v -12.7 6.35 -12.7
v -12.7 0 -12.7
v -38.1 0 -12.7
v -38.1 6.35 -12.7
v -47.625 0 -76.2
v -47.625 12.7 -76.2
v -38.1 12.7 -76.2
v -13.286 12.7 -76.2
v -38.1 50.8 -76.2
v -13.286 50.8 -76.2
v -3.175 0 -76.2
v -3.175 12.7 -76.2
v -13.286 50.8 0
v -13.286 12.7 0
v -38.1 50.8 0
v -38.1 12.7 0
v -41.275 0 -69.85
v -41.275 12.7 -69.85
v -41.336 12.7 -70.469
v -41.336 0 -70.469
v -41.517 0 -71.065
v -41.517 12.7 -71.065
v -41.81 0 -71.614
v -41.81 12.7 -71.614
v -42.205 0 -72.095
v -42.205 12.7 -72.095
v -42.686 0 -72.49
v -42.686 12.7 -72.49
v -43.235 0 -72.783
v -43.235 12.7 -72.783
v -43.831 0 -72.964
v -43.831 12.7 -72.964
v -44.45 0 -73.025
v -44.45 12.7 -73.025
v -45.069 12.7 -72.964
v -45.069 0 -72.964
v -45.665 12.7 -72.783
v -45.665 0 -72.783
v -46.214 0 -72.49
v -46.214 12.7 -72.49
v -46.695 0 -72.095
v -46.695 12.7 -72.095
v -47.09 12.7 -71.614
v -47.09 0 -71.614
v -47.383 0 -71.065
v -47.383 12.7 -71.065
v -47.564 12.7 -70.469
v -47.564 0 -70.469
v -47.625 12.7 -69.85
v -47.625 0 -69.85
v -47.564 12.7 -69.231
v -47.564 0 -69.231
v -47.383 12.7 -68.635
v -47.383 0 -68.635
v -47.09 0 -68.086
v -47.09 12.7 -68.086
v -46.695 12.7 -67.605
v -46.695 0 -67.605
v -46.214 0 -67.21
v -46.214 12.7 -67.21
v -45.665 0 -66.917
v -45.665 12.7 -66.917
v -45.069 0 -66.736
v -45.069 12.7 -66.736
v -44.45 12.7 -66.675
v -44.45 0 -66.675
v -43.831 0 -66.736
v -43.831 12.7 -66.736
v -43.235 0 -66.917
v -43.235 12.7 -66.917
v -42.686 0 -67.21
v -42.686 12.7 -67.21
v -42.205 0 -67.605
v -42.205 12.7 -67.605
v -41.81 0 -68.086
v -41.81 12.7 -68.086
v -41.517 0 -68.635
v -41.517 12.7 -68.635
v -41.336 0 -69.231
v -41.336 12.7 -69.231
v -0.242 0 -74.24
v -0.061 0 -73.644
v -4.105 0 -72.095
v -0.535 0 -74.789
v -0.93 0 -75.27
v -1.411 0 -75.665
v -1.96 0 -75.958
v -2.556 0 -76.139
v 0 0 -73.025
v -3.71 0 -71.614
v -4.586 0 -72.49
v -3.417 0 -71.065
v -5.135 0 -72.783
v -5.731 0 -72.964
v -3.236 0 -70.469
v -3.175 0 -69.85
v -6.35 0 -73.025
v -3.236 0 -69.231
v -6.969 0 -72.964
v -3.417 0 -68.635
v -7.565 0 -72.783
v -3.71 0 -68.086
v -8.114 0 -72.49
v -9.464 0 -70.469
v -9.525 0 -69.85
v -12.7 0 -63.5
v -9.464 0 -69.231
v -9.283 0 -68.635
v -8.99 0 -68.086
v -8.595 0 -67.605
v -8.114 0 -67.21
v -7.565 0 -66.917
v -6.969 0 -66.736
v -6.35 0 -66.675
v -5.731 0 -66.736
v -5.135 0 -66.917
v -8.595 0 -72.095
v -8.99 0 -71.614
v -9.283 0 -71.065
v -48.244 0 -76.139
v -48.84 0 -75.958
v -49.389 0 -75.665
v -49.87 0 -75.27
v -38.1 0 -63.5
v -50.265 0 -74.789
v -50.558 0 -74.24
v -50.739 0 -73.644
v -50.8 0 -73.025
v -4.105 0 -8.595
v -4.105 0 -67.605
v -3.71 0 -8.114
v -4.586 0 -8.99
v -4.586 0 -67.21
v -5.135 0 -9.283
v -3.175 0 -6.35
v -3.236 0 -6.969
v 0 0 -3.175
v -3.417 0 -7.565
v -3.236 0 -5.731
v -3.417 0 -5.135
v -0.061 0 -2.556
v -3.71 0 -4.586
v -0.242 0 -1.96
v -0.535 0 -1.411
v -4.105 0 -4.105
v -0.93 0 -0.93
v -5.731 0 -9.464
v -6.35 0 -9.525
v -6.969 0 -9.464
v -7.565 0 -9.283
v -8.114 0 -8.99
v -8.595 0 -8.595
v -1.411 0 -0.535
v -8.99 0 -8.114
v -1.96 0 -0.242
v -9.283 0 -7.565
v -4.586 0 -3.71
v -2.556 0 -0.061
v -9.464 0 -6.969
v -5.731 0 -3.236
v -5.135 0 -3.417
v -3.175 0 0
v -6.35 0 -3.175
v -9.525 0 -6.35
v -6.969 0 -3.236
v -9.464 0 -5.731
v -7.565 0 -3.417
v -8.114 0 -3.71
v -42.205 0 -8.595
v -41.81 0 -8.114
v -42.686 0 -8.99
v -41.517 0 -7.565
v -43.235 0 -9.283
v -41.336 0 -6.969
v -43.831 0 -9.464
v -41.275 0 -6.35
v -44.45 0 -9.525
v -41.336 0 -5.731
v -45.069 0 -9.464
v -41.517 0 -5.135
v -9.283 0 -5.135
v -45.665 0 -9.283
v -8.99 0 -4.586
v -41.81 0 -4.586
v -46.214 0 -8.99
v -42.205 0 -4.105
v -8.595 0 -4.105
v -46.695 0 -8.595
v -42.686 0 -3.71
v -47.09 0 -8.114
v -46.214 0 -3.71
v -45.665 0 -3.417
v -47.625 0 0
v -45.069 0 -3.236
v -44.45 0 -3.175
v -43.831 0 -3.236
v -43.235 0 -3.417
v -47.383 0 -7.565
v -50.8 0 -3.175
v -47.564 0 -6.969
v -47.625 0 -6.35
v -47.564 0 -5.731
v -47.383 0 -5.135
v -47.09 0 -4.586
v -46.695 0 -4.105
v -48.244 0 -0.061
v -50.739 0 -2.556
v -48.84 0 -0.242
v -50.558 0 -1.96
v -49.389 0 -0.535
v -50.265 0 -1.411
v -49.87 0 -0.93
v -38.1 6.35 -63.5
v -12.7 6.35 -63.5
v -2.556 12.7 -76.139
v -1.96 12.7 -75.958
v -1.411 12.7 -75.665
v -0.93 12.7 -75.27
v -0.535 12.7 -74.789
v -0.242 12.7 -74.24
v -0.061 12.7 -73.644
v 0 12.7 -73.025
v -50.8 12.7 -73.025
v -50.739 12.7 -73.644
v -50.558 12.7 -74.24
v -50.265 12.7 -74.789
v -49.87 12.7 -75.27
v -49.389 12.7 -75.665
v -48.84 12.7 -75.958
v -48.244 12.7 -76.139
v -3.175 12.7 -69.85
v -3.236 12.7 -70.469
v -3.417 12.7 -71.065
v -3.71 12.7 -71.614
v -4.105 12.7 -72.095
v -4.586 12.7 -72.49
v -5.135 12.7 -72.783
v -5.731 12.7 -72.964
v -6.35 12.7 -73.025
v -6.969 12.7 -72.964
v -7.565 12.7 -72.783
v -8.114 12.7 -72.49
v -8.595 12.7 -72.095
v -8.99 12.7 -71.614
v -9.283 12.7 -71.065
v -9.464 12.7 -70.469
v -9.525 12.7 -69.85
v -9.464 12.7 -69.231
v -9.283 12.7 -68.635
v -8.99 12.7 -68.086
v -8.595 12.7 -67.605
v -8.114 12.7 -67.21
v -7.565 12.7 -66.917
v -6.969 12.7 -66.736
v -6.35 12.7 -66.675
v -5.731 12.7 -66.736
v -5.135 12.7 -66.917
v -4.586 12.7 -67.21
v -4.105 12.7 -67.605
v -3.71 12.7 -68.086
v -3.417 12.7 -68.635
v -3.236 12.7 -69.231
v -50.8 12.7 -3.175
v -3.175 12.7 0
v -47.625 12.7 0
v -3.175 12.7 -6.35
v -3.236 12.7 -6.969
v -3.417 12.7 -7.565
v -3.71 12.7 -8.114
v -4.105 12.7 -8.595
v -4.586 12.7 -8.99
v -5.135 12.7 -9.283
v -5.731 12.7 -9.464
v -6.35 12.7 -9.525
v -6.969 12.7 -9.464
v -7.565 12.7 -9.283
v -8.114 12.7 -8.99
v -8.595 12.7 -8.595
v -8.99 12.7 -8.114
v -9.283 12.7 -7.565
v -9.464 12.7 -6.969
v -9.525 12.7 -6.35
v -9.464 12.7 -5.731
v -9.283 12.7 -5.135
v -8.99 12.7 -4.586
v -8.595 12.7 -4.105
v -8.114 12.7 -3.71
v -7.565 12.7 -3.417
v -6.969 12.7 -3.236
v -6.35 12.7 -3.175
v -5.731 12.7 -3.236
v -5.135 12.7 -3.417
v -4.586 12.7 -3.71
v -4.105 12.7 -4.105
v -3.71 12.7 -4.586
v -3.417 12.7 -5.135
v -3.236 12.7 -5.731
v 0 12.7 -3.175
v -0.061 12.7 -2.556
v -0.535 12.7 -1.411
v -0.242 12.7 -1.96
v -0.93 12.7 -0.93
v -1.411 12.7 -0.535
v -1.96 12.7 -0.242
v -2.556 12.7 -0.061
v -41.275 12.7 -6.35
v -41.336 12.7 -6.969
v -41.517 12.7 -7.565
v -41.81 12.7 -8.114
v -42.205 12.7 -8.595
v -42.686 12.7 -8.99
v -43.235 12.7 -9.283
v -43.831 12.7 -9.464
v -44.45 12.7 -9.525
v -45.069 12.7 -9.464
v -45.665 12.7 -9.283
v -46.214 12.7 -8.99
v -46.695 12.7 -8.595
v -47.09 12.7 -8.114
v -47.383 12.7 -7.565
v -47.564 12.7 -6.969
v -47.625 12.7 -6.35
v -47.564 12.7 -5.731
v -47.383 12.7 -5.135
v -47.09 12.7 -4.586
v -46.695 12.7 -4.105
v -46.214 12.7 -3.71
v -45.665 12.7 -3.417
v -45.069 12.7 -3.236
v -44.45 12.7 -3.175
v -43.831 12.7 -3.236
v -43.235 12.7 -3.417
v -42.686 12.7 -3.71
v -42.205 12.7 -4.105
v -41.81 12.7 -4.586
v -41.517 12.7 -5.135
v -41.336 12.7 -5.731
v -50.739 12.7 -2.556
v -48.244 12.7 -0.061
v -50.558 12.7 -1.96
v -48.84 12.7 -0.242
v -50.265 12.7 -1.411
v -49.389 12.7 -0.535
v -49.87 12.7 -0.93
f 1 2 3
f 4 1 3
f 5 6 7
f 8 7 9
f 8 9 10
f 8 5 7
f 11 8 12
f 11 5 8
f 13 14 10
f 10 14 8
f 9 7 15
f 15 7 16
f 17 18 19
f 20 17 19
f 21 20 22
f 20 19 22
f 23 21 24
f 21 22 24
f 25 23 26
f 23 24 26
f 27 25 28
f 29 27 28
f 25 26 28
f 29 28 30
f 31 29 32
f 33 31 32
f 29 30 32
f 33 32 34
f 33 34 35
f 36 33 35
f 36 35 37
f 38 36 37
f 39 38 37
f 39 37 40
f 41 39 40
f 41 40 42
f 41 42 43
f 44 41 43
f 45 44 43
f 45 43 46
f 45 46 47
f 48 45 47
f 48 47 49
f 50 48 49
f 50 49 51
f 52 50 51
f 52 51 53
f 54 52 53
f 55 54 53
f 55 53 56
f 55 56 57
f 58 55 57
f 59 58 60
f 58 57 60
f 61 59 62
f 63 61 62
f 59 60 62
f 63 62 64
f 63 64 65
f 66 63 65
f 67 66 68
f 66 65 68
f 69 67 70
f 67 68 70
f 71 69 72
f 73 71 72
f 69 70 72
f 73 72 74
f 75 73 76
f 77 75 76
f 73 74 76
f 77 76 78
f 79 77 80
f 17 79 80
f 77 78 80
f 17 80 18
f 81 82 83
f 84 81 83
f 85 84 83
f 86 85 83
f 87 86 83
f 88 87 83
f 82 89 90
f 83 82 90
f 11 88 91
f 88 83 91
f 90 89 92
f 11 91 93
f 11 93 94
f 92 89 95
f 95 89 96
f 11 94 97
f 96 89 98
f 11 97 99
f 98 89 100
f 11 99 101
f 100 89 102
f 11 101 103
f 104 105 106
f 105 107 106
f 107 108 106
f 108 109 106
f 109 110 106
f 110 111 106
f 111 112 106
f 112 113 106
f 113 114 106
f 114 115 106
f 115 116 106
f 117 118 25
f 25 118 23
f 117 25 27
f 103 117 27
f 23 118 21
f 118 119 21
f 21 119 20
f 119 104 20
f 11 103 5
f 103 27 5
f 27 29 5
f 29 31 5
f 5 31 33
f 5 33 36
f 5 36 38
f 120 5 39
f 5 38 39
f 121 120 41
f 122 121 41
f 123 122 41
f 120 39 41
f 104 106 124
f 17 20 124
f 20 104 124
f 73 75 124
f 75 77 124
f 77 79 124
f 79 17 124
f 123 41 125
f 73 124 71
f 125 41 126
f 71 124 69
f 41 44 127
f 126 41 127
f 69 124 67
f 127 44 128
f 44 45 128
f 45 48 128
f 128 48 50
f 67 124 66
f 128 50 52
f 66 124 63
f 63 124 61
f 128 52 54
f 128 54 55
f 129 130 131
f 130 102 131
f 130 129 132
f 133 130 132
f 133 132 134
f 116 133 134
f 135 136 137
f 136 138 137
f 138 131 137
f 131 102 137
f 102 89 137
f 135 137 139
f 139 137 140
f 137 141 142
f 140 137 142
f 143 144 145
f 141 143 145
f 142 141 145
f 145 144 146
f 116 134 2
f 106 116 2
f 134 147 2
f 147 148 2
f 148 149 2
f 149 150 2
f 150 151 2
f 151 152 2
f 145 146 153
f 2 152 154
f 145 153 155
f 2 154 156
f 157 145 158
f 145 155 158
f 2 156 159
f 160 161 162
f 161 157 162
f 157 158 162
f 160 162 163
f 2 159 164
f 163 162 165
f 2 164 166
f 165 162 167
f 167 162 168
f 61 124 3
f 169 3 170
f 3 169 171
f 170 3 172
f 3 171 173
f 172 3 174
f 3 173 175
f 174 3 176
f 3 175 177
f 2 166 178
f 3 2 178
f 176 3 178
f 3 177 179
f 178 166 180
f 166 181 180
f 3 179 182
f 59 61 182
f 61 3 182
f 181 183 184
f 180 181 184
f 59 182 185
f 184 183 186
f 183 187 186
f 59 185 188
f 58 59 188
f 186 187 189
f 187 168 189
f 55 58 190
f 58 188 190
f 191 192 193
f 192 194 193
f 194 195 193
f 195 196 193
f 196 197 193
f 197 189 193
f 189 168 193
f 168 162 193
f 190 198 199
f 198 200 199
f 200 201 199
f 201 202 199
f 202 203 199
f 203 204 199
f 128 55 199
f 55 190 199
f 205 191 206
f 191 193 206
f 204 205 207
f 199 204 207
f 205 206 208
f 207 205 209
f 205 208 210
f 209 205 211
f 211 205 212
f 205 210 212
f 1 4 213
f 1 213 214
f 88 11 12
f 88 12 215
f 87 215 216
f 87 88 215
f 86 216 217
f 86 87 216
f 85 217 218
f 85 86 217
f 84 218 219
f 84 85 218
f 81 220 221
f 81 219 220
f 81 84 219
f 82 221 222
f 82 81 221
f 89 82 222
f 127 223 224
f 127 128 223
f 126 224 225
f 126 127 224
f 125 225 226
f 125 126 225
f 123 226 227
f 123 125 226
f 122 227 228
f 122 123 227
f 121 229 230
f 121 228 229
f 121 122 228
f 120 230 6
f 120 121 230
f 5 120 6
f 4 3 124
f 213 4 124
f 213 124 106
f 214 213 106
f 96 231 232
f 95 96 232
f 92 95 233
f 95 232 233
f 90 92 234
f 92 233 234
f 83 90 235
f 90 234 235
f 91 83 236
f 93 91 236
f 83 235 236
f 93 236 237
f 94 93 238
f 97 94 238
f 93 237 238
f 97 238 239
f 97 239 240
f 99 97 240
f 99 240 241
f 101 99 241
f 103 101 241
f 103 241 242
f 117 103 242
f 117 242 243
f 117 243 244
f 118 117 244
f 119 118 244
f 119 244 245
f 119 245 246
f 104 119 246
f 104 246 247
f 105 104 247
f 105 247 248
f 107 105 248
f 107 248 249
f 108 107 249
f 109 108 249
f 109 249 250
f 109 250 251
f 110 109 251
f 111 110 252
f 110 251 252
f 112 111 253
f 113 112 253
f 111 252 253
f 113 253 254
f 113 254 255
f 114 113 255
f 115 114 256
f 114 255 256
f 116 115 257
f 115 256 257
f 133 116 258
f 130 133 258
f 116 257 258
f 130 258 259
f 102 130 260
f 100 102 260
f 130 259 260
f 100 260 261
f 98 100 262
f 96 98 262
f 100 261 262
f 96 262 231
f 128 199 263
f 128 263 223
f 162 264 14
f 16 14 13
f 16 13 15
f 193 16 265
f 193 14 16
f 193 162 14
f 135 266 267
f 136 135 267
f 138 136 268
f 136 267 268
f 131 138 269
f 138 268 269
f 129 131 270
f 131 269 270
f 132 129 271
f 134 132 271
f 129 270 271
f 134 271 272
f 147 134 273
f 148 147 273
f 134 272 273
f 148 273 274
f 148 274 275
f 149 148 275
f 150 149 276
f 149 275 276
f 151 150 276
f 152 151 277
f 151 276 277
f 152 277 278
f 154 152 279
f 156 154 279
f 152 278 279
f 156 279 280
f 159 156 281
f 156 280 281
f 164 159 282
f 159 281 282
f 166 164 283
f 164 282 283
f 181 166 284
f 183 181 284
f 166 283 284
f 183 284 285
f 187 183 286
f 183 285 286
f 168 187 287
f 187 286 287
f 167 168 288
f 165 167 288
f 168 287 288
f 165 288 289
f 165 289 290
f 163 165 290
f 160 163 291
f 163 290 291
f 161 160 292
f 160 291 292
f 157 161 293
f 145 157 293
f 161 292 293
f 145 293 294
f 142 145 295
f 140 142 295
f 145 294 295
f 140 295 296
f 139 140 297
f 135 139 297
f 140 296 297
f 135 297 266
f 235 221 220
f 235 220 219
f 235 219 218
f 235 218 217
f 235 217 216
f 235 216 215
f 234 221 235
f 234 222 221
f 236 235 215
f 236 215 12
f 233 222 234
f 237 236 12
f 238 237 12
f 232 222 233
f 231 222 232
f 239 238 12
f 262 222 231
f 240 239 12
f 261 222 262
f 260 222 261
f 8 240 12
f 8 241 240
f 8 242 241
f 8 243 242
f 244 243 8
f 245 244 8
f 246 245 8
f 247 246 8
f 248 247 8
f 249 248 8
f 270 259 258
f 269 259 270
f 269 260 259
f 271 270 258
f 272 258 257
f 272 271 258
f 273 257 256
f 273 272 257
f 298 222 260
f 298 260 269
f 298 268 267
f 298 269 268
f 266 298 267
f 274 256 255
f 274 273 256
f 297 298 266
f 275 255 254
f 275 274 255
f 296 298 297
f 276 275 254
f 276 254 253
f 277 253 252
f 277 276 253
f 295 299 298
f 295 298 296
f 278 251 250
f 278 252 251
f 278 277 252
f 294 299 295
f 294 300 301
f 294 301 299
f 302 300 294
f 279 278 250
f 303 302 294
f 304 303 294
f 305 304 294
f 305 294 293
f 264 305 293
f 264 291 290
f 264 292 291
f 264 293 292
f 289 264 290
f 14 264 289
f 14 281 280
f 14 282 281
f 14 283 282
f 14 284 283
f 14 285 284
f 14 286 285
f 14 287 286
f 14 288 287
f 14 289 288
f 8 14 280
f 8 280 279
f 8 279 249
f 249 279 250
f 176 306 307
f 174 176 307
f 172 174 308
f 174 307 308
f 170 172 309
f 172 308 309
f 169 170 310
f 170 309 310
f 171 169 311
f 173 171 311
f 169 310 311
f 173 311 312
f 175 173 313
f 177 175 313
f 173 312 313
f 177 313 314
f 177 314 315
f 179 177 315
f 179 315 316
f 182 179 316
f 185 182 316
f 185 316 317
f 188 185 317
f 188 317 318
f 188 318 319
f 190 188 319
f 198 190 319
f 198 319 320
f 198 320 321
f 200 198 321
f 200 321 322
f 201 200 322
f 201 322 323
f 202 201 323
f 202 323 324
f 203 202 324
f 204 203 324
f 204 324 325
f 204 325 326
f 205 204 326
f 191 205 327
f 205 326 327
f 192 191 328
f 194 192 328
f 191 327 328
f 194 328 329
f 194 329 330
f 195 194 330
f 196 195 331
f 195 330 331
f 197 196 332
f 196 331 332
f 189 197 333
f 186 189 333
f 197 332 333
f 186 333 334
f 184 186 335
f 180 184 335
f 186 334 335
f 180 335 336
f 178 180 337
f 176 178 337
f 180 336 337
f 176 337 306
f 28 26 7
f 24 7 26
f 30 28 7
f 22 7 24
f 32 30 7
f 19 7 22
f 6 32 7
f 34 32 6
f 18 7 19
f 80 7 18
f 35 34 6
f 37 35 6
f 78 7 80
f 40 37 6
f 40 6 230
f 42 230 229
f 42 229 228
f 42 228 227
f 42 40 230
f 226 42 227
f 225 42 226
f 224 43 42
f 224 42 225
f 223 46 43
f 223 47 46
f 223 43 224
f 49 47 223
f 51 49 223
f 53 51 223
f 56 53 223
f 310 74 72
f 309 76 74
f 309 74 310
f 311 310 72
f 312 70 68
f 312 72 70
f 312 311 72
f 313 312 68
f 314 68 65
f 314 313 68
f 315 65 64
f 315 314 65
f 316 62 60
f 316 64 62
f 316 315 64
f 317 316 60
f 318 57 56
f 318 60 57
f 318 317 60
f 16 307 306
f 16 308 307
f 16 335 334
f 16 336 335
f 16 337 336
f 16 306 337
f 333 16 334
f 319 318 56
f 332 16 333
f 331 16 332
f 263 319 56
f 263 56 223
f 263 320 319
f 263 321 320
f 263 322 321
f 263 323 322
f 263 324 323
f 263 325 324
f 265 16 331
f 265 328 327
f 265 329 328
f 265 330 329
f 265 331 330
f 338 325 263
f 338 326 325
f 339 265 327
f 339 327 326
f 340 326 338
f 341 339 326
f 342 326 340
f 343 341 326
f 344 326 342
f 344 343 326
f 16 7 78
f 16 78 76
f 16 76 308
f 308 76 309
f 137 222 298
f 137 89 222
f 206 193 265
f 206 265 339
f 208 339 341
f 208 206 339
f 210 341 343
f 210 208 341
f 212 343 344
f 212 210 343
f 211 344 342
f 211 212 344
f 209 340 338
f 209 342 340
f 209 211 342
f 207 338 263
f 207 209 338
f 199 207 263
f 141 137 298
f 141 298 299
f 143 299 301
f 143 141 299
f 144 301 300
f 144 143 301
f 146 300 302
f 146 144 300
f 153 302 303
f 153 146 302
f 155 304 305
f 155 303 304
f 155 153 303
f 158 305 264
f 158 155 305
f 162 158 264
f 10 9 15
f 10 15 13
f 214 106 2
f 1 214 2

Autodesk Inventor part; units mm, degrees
ref_plane "YZ Plane" through (0, 0, 0) normal (1, 0, 0) x (0, 1, 0)
ref_plane "XZ Plane" through (0, 0, 0) normal (0, 1, 0) x (-1, 0, 0)
ref_plane "XY Plane" through (0, 0, 0) normal (0, 0, 1) x (1, 0, 0)
sketch "Sketch1" plane through (0, 0, 0) normal (0, 1, 0) x (-1, 0, 0)
  line L0 (3.175, 0) -> (47.625, 0)
  line L1 (50.8, -3.175) -> (50.8, -73.025)
  line L2 (47.625, -76.2) -> (3.175, -76.2)
  line L3 (0, -73.025) -> (0, -3.175)
  arc A0 (50.8, -3.175) -> (47.625, 0) centre (47.625, -3.175) ccw
  arc A1 (3.175, 0) -> (0, -3.175) centre (3.175, -3.175) ccw
  arc A2 (0, -73.025) -> (3.175, -76.2) centre (3.175, -73.025) ccw
  arc A3 (47.625, -76.2) -> (50.8, -73.025) centre (47.625, -73.025) ccw
  point P0 (0, 0)
  point P1 (50.8, -76.2)
  point P2 (50.8, 0)
  point P3 (0, -76.2)
  dimension "d0" = 50.8
  dimension "d1" = 76.2
  dimension "d4" = 3.175
extrude "Extrusion1" add sketch "Sketch1" along normal blind 12.7
sketch "Sketch2" plane through (0, 12.7, 0) normal (0, 1, 0) x (1, 0, 0)
  line L0 (0, 0) -> (-6.35, 0) construction
  line L1 (-6.35, 0) -> (-6.35, 6.35) construction
  line L2 (-6.35, 6.35) -> (0, 6.35) construction
  line L3 (0, 6.35) -> (0, 0) construction
  circle A0 centre (-6.35, 6.35) radius 3.175
  line L4 (0, 3.175) -> (0, 73.025) construction
  line L5 (0, 38.1) -> (-50.8802, 38.1) construction
  line L6 (-50.8802, 38.1) -> (-25.4, 76.2) construction
  line L7 (-3.175, 76.2) -> (-47.625, 76.2) construction
  line L8 (-25.4, 76.2) -> (-25.4, 0) construction
  line L9 (-47.625, 0) -> (-3.175, 0) construction
  circle A1 centre (-6.35, 69.85) radius 3.175
  circle A2 centre (-44.45, 6.35) radius 3.175
  circle A3 centre (-44.45, 69.85) radius 3.175
  dimension "d5" = 6.35
  dimension "d6" = 6.35
  dimension "d7" = 6.35
extrude "Extrusion2" cut sketch "Sketch2" against normal through all
sketch "Sketch3" plane through (0, 12.7, 0) normal (0, 1, 0) x (1, 0, 0)
  line L0 (0, 0) -> (-12.7, 0) construction
  line L1 (0, 0) -> (12.7, 0) construction
  line L2 (-47.625, 0) -> (-3.175, 0) construction
  line L3 (-25.4, 0) -> (-25.4, 76.2) construction
  line L4 (-3.175, 76.2) -> (-47.625, 76.2) construction
  line L5 (-50.8, 0) -> (-38.1, 0) construction
  line L6 (-38.1, 0) -> (-13.2855, 0)
  line L7 (-13.2855, 0) -> (-13.2855, 76.2)
  line L8 (-13.2855, 76.2) -> (-38.1, 76.2)
  line L9 (-38.1, 76.2) -> (-38.1, 0)
  dimension "d14" = 12.7
  dimension "d15" = 180
extrude "Extrusion3" add sketch "Sketch3" along normal blind 38.1
sketch "Sketch4" plane through (0, 0, 0) normal (0, -1, 0) x (1, 0, 0)
  line L0 (0, 0) -> (-12.7, 0) construction
  line L1 (-12.7, 0) -> (-12.7, -12.7) construction
  line L2 (-12.7, -12.7) -> (0, -12.7) construction
  line L3 (0, -12.7) -> (0, 0) construction
  line L4 (-50.8, -76.2) -> (-38.1, -76.2) construction
  line L5 (-38.1, -76.2) -> (-38.1, -63.5) construction
  line L6 (-38.1, -63.5) -> (-50.8, -63.5) construction
  line L7 (-50.8, -63.5) -> (-50.8, -76.2) construction
  line L8 (-12.7, -12.7) -> (-38.1, -12.7)
  line L9 (-38.1, -12.7) -> (-38.1, -63.5)
  line L10 (-38.1, -63.5) -> (-12.7, -63.5)
  line L11 (-12.7, -63.5) -> (-12.7, -12.7)
  dimension "d18" = 12.7
  dimension "d19" = 12.7
  dimension "d20" = 12.7
  dimension "d21" = 12.7
extrude "Extrusion4" cut sketch "Sketch4" against normal blind 6.35
properties part number "Near Gantry Bracket"
